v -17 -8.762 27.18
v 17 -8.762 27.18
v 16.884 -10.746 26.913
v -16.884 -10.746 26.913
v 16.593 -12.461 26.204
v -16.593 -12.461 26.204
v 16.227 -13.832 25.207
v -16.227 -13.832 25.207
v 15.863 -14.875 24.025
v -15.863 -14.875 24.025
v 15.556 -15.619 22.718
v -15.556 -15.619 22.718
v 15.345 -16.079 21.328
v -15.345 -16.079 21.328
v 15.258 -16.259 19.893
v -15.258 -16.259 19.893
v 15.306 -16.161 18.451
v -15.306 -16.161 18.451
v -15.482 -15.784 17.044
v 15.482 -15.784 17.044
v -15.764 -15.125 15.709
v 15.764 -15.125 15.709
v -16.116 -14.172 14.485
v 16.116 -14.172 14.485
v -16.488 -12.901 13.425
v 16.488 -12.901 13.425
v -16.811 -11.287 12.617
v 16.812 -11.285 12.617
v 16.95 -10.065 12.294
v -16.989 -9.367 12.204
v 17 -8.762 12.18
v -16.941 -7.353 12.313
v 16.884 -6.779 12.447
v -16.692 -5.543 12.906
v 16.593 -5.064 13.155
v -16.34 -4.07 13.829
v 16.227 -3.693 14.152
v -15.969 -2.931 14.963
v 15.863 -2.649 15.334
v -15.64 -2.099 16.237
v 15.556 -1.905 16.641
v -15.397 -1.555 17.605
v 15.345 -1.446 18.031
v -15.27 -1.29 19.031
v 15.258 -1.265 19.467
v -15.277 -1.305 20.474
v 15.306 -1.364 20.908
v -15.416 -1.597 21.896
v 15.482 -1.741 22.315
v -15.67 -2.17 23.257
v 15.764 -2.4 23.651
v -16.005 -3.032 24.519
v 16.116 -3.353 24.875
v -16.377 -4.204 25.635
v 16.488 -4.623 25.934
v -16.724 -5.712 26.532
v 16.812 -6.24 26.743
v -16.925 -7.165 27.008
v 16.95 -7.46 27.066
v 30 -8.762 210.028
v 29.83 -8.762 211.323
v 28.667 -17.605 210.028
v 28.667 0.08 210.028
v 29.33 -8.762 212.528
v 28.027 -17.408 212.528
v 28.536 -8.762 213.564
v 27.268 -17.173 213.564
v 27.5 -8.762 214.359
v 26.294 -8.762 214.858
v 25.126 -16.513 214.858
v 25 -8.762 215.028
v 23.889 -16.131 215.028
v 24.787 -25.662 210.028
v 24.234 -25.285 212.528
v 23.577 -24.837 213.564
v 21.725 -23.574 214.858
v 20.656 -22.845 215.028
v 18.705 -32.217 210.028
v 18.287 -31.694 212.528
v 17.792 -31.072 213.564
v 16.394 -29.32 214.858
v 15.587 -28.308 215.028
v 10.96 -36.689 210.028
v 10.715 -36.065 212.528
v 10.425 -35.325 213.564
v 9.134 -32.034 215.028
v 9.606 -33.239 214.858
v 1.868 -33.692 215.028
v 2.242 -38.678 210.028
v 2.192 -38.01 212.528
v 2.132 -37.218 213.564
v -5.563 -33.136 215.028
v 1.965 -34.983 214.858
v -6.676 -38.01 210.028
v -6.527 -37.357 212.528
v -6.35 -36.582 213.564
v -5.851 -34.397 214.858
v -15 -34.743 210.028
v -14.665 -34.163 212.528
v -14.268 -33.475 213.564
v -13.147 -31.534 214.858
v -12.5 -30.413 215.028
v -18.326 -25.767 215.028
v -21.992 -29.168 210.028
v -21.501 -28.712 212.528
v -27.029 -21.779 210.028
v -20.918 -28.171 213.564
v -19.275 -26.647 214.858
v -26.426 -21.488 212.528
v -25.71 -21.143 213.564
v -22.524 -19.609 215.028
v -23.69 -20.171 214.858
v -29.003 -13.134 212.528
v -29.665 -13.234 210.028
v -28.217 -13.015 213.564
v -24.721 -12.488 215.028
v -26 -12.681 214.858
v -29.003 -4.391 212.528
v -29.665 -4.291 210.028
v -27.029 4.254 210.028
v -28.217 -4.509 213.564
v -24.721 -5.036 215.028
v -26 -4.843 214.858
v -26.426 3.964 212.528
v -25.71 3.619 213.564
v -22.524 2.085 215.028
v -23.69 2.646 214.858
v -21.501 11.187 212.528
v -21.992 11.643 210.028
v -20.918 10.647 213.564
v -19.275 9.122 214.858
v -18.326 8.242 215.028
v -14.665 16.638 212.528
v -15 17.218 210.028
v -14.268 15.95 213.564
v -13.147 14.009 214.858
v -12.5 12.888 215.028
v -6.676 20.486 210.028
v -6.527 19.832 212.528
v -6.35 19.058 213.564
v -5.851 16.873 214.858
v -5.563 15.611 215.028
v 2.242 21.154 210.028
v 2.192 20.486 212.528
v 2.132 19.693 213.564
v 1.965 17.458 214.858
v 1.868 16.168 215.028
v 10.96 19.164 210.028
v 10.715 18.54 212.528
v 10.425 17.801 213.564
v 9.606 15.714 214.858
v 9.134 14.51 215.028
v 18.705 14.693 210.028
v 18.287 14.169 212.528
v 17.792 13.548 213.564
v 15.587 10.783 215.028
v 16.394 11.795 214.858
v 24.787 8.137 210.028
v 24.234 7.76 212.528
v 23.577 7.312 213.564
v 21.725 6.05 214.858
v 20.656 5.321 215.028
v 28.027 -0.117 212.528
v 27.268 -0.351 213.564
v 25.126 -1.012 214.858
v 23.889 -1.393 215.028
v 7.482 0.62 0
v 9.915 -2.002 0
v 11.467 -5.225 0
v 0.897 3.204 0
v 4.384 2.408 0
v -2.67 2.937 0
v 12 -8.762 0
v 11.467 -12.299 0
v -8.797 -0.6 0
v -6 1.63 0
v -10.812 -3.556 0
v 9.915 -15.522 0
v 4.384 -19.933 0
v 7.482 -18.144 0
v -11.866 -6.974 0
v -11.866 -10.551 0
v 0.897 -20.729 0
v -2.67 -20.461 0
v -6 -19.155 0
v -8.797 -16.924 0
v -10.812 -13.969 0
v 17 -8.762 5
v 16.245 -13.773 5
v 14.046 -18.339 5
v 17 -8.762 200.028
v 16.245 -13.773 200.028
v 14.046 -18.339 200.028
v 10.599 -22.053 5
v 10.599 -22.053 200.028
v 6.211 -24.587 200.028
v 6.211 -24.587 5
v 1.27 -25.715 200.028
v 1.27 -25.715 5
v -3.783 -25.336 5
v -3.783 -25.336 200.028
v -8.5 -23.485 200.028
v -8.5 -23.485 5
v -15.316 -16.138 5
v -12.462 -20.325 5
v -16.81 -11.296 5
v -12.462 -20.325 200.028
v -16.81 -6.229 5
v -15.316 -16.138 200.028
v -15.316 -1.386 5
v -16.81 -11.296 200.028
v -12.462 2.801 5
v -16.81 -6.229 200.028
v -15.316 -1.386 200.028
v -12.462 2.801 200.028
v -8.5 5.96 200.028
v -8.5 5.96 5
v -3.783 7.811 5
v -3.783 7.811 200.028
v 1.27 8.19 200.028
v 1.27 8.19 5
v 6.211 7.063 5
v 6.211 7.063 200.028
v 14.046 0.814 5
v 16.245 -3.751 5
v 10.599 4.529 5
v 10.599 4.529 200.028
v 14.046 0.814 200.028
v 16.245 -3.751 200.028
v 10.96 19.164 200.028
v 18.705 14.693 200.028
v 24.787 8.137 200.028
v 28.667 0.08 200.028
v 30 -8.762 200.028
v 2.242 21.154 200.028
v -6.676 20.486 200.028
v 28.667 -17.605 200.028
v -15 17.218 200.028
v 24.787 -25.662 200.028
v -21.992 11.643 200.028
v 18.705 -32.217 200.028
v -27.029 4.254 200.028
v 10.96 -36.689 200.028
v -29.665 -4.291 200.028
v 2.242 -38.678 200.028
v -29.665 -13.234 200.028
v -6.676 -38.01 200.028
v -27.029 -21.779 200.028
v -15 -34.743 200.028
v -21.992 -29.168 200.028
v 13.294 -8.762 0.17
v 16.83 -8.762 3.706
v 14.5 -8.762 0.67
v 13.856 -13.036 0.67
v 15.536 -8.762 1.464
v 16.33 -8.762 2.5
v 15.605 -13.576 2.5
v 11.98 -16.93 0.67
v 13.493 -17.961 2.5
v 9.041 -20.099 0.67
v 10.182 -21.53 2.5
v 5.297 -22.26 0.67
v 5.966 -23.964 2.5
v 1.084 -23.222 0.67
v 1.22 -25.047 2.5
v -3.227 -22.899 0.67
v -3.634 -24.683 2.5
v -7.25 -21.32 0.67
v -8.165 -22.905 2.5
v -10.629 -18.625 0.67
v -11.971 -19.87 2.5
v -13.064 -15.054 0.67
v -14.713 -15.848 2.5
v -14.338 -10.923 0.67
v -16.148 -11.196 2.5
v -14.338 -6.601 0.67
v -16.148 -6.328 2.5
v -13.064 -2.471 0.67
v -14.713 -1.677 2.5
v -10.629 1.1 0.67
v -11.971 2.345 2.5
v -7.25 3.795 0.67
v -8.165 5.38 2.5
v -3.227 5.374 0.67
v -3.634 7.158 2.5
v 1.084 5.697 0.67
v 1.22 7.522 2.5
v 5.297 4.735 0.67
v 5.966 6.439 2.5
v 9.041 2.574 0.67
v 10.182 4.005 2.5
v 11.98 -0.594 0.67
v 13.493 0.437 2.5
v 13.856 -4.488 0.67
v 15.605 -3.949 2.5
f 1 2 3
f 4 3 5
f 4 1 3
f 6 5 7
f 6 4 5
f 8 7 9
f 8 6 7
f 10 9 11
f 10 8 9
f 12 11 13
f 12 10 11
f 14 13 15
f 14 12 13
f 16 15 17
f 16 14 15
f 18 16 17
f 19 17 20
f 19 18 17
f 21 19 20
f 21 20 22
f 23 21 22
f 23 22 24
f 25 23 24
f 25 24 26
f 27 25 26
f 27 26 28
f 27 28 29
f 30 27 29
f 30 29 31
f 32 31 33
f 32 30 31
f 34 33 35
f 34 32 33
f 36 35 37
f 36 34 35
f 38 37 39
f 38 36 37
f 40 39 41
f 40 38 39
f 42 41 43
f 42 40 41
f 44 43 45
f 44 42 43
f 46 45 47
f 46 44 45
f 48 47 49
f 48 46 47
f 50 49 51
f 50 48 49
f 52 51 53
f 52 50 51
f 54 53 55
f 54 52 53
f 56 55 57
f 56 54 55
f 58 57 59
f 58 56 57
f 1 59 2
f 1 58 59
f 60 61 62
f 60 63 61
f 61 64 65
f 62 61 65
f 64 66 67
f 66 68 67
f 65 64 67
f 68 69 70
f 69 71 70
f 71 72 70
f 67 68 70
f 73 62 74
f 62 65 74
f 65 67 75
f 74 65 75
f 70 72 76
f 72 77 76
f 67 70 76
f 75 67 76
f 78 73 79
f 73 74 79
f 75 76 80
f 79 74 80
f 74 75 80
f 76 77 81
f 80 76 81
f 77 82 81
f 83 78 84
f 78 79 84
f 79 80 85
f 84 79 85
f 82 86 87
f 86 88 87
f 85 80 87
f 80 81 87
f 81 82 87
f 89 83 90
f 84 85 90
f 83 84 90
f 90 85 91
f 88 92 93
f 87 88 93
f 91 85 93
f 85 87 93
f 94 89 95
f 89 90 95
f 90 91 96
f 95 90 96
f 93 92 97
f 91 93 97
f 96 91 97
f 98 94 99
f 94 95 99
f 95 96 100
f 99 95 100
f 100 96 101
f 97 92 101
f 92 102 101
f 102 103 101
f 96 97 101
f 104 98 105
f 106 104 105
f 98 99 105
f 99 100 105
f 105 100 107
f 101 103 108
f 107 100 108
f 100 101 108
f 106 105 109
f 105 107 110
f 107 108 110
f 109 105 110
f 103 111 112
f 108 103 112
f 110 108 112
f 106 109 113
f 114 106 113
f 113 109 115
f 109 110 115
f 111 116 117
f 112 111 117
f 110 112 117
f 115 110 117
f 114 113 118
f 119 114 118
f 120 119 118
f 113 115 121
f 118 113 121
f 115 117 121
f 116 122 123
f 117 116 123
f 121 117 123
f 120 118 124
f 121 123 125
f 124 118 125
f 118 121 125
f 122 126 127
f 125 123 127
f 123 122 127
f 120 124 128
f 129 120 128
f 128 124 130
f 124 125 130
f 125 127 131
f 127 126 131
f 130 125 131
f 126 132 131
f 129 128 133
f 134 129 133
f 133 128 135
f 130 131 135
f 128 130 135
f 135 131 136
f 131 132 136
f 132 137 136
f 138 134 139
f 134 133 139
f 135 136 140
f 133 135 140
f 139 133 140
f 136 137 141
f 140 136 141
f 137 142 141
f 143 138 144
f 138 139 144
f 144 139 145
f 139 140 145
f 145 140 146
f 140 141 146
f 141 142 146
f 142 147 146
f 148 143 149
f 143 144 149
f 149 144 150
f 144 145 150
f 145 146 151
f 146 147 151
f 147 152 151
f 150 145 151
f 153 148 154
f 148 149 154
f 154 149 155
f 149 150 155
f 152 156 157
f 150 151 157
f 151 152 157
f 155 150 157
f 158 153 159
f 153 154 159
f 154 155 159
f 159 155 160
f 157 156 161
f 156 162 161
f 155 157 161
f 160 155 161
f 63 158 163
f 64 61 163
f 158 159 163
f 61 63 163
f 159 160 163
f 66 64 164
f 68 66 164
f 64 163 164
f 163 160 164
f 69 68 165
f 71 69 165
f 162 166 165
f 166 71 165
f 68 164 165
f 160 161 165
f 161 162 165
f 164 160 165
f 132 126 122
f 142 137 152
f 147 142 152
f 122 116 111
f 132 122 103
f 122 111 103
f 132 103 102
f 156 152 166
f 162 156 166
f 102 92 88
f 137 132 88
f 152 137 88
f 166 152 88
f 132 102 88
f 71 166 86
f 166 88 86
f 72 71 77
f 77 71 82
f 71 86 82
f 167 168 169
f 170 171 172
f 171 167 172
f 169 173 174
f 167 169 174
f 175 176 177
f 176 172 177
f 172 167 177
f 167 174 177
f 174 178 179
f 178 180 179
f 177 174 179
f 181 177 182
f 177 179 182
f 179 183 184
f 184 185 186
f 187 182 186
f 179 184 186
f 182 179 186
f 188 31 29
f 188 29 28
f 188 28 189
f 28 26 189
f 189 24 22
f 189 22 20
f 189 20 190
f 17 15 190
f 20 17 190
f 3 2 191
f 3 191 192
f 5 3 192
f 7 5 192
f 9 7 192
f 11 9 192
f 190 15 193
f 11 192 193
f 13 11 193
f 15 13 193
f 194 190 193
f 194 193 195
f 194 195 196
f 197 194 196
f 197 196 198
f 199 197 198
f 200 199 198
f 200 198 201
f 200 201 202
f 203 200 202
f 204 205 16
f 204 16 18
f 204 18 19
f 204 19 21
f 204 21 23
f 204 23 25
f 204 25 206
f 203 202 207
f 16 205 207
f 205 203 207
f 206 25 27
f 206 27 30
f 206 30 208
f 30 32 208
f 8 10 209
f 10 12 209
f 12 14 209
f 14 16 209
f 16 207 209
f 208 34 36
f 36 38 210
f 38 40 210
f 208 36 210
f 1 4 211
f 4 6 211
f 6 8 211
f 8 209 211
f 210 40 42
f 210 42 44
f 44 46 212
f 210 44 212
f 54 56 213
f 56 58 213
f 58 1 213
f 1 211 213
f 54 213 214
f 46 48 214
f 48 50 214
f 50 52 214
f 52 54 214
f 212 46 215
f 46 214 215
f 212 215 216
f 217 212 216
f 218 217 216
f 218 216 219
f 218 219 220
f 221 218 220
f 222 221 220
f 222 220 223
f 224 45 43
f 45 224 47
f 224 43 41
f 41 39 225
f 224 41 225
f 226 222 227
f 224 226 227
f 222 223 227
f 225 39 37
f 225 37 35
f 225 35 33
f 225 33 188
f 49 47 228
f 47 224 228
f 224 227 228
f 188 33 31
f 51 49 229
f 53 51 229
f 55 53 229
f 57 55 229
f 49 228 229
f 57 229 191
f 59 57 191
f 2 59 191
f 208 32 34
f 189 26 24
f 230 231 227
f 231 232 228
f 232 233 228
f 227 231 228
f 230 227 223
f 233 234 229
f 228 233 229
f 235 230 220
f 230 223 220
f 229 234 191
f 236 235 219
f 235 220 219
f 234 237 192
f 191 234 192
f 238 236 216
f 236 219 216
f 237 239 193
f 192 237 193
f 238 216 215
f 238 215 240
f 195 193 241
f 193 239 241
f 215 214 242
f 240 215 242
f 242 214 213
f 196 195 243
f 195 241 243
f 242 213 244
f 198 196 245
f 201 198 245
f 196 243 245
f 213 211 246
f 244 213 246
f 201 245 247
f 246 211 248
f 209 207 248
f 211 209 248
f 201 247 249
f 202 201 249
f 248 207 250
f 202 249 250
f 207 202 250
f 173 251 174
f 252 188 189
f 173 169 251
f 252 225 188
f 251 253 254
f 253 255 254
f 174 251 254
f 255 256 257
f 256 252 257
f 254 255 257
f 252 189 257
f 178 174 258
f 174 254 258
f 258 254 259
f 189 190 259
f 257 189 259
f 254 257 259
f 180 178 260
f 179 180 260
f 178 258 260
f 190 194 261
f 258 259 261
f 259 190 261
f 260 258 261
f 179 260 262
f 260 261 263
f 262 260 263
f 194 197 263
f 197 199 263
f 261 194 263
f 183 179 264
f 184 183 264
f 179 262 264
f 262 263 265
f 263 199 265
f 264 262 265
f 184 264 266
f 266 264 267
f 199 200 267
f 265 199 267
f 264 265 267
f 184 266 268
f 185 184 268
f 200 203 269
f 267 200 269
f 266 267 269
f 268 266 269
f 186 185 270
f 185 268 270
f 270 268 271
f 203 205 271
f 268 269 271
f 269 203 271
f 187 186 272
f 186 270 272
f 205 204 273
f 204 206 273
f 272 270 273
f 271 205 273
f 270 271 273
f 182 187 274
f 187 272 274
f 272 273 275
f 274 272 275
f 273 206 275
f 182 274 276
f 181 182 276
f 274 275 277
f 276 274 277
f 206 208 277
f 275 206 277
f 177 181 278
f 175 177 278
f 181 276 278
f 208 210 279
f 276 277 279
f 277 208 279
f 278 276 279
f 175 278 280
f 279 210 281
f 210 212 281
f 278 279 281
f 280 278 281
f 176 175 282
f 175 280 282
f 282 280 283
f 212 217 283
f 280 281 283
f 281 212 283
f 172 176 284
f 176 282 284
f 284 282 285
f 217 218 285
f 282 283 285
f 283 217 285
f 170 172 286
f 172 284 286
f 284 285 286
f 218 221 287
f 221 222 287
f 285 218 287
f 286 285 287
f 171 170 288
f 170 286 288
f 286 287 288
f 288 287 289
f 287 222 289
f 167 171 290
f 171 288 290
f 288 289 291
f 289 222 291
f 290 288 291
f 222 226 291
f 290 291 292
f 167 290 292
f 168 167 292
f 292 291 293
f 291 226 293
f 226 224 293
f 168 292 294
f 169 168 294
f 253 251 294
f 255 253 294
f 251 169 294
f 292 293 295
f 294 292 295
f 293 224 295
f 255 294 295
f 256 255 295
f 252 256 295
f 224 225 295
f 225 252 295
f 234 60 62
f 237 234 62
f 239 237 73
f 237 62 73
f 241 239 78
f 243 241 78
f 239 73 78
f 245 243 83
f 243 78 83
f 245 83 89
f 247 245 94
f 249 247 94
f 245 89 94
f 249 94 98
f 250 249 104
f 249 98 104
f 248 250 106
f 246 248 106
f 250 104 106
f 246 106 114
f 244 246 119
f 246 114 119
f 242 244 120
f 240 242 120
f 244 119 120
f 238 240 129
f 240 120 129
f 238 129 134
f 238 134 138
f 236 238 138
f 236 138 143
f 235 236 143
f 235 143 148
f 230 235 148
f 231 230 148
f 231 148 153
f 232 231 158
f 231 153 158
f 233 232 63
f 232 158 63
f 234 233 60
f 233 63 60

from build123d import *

# Parameters (mm, degrees)
FILLET2_R               = 5
FILLET3_R               = 5
CUT_EXTRUDE1_DEPTH      = 20
CUT_EXTRUDE1_DEPTH_BACK = 20
SKETCH5_R               = 7.5


with BuildPart() as part:
    # Sketch4 → Revolve1 (revolve)
    with BuildSketch(Plane(origin=(0, 0, 0), x_dir=(0, 0, -1), z_dir=(1, 0, 0))):
        Polygon((-215.028448312, -8.762321339), (0, -8.762321339), (0, 8.237678661), (-200.028448312, 8.237678661), (-200.028448312, 21.237678661), (-215.028448312, 21.237678661), align=None)
    revolve(axis=Axis((0, -8.762321339, 221.52106333), (0, 0, -1)))

    # Fillet2
    fillet2_edges = [part.edges().sort_by_distance(p)[0] for p in [
        (0, -25.762321339, 0),
    ]]
    fillet(fillet2_edges, radius=FILLET2_R)

    # Fillet3
    fillet3_edges = [part.edges().sort_by_distance(p)[0] for p in [
        (0, -38.762321339, 215.028448312),
    ]]
    fillet(fillet3_edges, radius=FILLET3_R)

    # Sketch5 → Cut-Extrude1 (cut, two sides: drawn at the far end of the back side and taken through both)
    with BuildSketch(Plane(origin=(0, 0, 0), x_dir=(0, 0, -1), z_dir=(1, 0, 0)).offset(-CUT_EXTRUDE1_DEPTH_BACK)):
        with Locations((-19.67963909, -8.762321339)):
            Circle(SKETCH5_R)
    extrude(amount=CUT_EXTRUDE1_DEPTH + CUT_EXTRUDE1_DEPTH_BACK, mode=Mode.SUBTRACT)


solid = part.part
